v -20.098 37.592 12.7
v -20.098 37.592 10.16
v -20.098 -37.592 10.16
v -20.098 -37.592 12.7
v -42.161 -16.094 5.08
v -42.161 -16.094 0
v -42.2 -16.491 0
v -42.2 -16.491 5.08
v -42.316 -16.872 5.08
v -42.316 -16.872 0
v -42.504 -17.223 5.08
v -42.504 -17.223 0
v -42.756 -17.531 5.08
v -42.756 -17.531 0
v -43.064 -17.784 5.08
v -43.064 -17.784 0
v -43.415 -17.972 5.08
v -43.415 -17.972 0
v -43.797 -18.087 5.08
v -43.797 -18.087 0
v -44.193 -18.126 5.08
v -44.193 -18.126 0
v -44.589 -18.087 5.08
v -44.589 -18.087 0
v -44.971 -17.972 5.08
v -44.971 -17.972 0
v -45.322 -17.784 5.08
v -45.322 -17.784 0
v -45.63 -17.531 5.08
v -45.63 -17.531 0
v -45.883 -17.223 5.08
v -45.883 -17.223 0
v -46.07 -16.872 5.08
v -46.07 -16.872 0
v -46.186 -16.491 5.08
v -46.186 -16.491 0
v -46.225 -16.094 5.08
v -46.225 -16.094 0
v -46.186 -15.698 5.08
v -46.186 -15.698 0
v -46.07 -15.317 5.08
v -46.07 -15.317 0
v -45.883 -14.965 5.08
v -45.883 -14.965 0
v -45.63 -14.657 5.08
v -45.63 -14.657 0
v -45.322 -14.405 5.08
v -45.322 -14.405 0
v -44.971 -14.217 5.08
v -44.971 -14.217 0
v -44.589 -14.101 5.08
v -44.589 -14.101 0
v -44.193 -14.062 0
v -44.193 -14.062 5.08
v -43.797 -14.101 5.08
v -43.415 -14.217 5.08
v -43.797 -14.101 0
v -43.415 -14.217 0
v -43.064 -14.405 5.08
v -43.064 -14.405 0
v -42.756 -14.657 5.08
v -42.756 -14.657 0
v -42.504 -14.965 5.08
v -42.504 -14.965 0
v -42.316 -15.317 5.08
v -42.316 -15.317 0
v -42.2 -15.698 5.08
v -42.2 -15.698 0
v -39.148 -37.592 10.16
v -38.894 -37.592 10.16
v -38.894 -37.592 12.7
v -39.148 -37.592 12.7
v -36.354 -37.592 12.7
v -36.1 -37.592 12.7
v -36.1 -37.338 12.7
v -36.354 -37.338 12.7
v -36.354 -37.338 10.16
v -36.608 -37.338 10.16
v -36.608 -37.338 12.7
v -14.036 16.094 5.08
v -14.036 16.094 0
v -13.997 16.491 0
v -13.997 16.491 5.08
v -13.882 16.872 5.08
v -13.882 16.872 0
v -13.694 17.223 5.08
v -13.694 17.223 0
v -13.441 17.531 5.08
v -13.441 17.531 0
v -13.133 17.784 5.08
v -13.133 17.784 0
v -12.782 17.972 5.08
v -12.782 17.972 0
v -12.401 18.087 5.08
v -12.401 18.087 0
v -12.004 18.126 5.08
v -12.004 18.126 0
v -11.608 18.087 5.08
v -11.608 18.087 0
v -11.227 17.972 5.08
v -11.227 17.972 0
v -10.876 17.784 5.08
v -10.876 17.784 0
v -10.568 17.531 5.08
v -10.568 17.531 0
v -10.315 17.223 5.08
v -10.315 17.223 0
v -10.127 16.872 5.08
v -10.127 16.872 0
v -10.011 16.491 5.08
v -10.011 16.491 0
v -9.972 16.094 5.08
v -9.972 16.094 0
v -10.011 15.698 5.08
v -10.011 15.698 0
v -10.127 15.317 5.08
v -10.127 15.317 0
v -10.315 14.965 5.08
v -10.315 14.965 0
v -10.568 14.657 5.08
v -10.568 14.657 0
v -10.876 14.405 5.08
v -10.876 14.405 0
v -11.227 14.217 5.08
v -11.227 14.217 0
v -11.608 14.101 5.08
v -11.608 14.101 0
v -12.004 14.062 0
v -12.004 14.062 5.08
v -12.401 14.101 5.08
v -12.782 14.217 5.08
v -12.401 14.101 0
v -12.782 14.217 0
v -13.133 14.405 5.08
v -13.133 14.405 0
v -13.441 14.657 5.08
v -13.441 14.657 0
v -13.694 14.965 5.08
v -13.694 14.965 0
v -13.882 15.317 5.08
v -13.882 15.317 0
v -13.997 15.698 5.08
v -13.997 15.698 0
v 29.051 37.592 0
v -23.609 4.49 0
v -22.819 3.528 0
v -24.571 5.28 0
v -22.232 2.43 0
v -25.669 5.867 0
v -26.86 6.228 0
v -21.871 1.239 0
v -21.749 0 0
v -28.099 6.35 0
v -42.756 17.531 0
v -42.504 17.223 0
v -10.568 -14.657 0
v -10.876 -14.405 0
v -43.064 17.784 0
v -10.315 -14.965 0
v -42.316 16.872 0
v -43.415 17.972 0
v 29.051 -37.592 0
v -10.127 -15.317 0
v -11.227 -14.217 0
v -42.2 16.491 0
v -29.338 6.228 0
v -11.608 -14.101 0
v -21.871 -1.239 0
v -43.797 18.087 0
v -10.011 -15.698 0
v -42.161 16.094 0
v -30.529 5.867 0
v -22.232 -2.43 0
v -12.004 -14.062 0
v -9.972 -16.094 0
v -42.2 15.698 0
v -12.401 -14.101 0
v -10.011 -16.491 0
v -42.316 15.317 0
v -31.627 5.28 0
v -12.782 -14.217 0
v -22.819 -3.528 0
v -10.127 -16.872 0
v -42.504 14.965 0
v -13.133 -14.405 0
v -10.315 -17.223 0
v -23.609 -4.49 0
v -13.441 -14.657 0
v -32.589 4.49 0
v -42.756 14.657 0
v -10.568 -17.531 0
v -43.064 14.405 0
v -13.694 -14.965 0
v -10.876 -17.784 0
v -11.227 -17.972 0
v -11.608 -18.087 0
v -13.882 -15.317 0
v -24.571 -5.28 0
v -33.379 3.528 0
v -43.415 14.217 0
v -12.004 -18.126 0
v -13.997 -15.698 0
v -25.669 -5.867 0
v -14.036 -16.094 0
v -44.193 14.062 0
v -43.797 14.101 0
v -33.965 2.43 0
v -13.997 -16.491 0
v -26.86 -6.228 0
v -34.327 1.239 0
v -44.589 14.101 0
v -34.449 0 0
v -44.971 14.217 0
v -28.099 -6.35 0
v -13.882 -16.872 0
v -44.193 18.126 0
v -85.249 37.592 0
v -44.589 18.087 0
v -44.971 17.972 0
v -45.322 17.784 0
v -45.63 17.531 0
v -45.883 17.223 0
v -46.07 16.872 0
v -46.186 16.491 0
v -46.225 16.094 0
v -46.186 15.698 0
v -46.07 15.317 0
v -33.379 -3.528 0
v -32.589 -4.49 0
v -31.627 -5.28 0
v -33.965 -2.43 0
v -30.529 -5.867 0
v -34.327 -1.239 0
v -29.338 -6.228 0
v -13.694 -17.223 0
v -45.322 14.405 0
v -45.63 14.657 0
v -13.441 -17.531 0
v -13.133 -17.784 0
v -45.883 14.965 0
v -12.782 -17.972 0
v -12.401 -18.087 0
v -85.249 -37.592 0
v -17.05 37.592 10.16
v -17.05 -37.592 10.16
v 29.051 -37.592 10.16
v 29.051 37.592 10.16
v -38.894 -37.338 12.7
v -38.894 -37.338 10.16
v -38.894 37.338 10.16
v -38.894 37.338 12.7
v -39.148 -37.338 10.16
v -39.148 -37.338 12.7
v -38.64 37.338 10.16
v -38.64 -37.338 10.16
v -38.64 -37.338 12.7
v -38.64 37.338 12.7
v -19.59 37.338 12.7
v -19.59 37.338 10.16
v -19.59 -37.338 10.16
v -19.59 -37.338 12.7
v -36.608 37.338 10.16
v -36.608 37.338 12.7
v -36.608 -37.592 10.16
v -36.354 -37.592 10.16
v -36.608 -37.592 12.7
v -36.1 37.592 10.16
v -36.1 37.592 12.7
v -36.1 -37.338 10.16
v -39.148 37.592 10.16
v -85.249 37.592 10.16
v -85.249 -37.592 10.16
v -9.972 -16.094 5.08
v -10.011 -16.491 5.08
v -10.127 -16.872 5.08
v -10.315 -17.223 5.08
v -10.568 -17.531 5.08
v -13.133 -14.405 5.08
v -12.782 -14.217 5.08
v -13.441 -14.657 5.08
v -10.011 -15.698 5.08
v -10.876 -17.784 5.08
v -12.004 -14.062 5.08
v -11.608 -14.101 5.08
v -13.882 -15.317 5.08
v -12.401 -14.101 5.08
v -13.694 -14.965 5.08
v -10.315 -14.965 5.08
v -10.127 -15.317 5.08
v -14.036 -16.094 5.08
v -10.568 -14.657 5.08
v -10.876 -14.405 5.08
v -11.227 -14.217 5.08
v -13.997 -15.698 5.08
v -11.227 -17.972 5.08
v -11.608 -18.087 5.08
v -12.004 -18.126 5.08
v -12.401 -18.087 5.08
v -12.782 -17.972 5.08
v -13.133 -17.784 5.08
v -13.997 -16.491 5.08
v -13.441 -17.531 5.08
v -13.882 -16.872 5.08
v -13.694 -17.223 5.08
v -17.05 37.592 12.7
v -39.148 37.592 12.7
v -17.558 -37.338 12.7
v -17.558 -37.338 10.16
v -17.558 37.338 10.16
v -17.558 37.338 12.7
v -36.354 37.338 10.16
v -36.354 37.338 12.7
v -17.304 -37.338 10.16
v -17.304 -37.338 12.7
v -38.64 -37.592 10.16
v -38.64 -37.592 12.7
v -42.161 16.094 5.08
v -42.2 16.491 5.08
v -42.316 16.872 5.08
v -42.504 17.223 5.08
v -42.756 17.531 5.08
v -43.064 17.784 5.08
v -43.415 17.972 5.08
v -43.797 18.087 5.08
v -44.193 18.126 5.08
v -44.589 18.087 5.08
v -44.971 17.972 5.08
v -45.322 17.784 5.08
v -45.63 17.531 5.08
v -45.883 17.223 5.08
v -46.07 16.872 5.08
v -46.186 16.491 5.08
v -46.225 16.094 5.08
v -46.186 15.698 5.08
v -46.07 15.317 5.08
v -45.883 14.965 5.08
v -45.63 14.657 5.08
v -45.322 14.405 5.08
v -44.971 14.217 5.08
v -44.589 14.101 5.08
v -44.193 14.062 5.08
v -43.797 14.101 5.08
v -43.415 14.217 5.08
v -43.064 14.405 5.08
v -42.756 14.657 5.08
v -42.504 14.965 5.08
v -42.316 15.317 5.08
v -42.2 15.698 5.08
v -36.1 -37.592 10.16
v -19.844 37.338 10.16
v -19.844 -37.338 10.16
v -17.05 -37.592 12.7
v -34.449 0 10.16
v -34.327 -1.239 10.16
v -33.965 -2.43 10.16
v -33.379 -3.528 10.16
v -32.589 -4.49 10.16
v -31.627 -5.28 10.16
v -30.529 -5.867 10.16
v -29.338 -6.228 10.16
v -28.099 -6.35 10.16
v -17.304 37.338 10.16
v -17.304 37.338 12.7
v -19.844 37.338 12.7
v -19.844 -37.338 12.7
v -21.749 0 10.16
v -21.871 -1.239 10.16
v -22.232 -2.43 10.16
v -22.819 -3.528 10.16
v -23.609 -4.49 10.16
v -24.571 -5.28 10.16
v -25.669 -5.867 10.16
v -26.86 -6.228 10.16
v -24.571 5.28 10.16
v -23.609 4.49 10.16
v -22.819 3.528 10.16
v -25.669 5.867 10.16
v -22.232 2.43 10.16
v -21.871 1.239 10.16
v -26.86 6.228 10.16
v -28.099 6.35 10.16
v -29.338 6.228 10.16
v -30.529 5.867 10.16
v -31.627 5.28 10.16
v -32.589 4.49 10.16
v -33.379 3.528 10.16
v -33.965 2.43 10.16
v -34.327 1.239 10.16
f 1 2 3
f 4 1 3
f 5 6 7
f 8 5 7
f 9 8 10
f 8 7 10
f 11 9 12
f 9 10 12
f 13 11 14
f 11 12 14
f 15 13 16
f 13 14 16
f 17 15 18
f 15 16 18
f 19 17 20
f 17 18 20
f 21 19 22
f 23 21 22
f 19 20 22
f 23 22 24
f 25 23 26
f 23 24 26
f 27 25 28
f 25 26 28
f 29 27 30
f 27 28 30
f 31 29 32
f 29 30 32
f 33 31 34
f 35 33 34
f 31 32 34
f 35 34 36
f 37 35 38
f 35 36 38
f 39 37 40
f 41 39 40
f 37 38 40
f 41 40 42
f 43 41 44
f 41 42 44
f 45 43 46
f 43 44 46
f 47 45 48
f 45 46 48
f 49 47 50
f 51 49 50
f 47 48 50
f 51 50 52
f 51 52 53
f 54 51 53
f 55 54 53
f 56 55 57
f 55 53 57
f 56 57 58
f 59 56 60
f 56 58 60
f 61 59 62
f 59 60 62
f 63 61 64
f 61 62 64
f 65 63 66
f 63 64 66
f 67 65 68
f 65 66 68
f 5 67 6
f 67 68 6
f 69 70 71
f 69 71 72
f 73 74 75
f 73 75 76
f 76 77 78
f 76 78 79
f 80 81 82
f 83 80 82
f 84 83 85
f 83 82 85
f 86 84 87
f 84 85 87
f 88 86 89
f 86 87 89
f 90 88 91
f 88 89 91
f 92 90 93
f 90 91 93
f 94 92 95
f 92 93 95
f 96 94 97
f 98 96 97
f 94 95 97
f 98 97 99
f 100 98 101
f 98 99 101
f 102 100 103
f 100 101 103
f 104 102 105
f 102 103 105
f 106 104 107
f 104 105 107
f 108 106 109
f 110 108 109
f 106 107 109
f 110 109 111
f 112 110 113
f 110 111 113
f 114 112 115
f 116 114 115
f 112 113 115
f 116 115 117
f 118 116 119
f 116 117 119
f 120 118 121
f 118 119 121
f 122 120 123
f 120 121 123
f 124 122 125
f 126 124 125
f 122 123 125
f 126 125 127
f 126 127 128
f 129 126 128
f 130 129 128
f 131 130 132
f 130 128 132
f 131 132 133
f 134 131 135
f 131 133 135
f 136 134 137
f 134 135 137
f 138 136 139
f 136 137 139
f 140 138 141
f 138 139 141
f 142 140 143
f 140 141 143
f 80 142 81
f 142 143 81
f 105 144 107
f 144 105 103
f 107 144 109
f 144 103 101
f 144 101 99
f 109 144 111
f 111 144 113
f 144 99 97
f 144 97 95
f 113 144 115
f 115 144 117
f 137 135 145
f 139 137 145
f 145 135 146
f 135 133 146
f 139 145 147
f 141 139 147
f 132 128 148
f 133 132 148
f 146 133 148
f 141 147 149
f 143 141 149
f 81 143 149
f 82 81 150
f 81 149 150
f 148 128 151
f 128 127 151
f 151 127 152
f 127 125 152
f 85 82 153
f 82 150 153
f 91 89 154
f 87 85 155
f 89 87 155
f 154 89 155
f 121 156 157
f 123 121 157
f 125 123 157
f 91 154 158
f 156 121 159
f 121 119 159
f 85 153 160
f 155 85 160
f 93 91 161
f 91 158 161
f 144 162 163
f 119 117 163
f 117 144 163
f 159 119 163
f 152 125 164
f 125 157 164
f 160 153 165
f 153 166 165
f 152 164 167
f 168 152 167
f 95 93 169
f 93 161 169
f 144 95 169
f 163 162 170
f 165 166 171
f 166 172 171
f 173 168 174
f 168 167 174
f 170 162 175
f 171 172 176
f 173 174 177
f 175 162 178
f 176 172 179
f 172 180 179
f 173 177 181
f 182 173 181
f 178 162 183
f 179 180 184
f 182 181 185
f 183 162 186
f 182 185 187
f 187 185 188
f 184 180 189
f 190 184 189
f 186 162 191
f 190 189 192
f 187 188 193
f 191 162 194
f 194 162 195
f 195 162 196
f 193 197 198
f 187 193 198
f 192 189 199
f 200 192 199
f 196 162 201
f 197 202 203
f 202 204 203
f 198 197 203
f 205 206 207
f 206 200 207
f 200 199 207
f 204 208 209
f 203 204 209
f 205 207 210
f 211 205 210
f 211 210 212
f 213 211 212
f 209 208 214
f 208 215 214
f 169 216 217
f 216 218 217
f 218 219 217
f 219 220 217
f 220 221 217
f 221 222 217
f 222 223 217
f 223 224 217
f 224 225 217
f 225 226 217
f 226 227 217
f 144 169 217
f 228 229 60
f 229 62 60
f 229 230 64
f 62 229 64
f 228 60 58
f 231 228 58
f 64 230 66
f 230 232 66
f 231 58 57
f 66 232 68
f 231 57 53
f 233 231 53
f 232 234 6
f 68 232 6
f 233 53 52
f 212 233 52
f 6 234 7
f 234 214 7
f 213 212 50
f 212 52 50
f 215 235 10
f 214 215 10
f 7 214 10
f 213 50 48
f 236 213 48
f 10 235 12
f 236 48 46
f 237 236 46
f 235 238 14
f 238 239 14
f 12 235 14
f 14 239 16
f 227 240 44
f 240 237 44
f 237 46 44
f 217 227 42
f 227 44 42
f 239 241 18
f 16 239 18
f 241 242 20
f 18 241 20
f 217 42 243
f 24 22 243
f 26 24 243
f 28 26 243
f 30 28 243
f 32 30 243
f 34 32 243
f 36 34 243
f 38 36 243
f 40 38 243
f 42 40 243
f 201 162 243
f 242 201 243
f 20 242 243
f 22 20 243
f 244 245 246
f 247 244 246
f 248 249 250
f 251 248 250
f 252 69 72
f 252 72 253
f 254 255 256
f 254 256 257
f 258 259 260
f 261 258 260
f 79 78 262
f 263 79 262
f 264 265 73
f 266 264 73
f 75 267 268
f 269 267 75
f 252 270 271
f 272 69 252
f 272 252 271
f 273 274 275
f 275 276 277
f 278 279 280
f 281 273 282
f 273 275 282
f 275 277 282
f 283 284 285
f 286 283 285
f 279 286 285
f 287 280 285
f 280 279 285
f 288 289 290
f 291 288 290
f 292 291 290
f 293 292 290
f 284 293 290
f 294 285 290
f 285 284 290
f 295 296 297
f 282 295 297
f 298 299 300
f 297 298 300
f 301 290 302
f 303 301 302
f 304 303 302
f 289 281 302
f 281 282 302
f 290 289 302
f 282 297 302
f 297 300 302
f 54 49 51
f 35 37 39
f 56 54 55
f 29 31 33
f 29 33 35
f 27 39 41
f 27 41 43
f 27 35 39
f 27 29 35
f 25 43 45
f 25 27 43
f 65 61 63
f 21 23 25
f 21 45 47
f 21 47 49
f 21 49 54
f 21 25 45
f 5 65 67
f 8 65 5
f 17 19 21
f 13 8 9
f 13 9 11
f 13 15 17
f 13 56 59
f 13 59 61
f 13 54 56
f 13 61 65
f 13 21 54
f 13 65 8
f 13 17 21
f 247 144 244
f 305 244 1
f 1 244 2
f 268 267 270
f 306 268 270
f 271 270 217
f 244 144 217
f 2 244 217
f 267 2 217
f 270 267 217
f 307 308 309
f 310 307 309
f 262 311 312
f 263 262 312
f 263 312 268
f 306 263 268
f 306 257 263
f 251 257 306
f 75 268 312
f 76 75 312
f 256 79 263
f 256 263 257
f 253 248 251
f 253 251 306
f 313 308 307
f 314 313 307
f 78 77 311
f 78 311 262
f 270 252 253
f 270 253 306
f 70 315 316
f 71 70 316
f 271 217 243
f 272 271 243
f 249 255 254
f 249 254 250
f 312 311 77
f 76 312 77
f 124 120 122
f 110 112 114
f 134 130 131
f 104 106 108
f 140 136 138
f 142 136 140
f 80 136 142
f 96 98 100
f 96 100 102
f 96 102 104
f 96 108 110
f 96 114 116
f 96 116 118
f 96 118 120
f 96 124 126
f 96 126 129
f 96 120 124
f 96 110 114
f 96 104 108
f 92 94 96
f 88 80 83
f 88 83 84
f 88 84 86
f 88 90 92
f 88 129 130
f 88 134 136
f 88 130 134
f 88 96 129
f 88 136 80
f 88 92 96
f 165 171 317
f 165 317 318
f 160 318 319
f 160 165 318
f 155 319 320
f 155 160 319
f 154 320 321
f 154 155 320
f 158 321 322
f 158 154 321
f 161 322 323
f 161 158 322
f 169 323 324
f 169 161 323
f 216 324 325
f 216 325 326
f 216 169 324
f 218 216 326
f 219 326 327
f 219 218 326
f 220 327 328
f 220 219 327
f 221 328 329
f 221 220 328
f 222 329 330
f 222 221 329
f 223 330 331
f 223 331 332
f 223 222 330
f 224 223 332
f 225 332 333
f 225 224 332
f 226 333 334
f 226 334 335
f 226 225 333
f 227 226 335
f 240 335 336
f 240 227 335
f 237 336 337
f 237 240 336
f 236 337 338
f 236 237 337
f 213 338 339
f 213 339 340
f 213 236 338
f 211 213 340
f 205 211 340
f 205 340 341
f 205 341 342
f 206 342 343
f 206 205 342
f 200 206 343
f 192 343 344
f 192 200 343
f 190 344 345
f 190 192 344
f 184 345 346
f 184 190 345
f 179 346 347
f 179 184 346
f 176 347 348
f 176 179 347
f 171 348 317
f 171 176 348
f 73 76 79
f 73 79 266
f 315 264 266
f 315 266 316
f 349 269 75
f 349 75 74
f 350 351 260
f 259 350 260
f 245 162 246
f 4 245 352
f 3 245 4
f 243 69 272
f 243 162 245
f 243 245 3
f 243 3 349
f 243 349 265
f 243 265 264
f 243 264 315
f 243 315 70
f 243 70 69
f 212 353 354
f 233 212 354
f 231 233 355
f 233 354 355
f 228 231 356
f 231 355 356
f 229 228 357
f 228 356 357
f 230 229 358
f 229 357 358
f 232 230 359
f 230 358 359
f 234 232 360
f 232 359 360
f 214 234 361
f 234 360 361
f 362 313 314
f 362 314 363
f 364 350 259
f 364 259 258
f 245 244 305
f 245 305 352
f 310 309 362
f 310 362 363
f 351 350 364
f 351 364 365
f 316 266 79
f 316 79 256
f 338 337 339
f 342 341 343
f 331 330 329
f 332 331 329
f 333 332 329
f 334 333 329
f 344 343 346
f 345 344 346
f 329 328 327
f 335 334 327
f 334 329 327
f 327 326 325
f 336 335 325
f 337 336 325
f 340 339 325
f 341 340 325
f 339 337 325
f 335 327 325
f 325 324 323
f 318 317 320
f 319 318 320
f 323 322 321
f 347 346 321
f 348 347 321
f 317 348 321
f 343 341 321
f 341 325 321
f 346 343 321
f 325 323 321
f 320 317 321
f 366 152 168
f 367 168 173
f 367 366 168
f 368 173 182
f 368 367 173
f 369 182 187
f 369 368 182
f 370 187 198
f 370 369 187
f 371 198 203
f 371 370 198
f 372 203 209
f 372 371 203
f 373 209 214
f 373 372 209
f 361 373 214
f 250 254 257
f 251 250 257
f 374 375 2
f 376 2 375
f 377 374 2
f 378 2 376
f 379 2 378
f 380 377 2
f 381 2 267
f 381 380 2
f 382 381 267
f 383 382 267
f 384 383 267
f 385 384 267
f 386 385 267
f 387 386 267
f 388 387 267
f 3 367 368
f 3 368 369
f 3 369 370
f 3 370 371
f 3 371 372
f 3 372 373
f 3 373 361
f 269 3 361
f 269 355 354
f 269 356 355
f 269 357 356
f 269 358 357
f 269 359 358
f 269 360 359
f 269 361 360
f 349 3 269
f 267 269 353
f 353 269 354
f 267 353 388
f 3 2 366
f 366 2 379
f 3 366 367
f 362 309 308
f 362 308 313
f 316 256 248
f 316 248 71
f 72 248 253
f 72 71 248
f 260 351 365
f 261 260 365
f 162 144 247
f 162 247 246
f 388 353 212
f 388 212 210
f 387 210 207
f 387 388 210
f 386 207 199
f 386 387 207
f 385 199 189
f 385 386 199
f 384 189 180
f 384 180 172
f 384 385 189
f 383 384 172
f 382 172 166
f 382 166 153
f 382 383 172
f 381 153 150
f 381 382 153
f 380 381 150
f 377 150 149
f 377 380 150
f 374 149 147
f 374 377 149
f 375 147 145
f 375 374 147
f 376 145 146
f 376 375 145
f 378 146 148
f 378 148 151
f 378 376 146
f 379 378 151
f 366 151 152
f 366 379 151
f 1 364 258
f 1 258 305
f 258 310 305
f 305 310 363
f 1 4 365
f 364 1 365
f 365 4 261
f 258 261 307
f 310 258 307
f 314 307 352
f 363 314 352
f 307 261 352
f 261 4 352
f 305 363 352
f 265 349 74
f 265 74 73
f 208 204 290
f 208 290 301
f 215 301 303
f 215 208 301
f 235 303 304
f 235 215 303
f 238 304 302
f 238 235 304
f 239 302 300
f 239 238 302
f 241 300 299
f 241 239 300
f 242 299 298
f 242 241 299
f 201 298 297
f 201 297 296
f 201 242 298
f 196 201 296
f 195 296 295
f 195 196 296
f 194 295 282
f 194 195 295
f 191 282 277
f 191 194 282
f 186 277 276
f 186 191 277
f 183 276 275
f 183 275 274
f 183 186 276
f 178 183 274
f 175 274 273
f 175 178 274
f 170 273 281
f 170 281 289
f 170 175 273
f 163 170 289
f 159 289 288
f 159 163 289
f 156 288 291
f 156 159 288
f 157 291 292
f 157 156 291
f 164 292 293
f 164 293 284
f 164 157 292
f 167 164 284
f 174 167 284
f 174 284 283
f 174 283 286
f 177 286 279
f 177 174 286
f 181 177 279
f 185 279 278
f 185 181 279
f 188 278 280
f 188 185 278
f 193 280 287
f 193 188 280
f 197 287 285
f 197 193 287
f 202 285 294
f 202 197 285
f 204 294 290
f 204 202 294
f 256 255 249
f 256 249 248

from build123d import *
from build123d.topology import SkipClean

# Parameters (mm, degrees)
SKETCH1_W                 = 57.15
SKETCH1_H                 = 37.592
BOSS_EXTRUDE1_DEPTH       = 10.16
SKETCH2_W                 = 0.254
SKETCH2_H                 = 37.592
SKETCH2_W_2               = 2.032
BOSS_EXTRUDE2_DEPTH       = 2.54
SKETCH3_R                 = 6.35
CUT_EXTRUDE1_DEPTH        = 21.082
SKETCH4_R                 = 2.032
CUT_EXTRUDE2_DEPTH        = 5.08
SKETCH5_W                 = 2.54
SKETCH5_H                 = 0.254
BOSS_EXTRUDE3_DEPTH       = 3.048
MIRROR2_COPY_1_SKETCH_W   = 57.15
MIRROR2_COPY_1_SKETCH_H   = 37.592
MIRROR2_COPY_1_DEPTH      = 10.16
MIRROR2_COPY_2_SKETCH_W   = 0.254
MIRROR2_COPY_2_SKETCH_H   = 37.592
MIRROR2_COPY_2_SKETCH_W_2 = 2.032
MIRROR2_COPY_2_DEPTH      = 2.54
MIRROR2_COPY_3_SKETCH_R   = 6.35
MIRROR2_COPY_3_DEPTH      = 21.082
MIRROR2_COPY_4_SKETCH_R   = 2.032
MIRROR2_COPY_4_DEPTH      = 5.08
MIRROR2_COPY_5_SKETCH_W   = 2.54
MIRROR2_COPY_5_SKETCH_H   = 0.254
MIRROR2_COPY_5_DEPTH      = 3.048


with BuildPart() as part:
    # Sketch1 → Boss-Extrude1 (new body)
    with BuildSketch(Plane.XY):
        with Locations((0.47625, 18.796)):
            Rectangle(SKETCH1_W, SKETCH1_H)
    boss_extrude1 = extrude(amount=BOSS_EXTRUDE1_DEPTH)

    # Sketch2 → Boss-Extrude2 (add)
    with BuildSketch(Plane.XY.offset(10.16)):
        with Locations((-19.97075, 18.796)):
            Rectangle(SKETCH2_W, SKETCH2_H)
        with Locations((-18.57375, 18.796)):
            Rectangle(SKETCH2_W_2, SKETCH2_H)
        with Locations((-17.17675, 18.796)):
            Rectangle(SKETCH2_W, SKETCH2_H)
    boss_extrude2 = extrude(amount=BOSS_EXTRUDE2_DEPTH)

    # Sketch3 → Cut-Extrude1 (cut)
    with BuildSketch(Plane.XY.offset(10.16)):
        with Locations((-28.09875, 0)):
            Circle(SKETCH3_R)
    cut_extrude1 = extrude(amount=-CUT_EXTRUDE1_DEPTH, mode=Mode.SUBTRACT)

    # Sketch4 → Cut-Extrude2 (cut)
    with BuildSketch(Plane(origin=(0, 0, 0), x_dir=(-1, 0, 0), z_dir=(0, 0, -1))):
        with Locations((12.004431959, 16.094318041)):
            Circle(SKETCH4_R)
    cut_extrude2 = extrude(amount=-CUT_EXTRUDE2_DEPTH, mode=Mode.SUBTRACT)

    # Sketch5 → Boss-Extrude3 (add)
    with BuildSketch(Plane.ZY.offset(20.09775)):
        with Locations((11.43, 37.465)):
            Rectangle(SKETCH5_W, SKETCH5_H)
    boss_extrude3 = extrude(amount=-BOSS_EXTRUDE3_DEPTH)

    # Mirror1: Boss-Extrude1, Boss-Extrude2, Cut-Extrude1, Cut-Extrude2, Boss-Extrude3 across plane
    with SkipClean():  # the faces are left unmerged after this step: merging them gives an invalid solid
        add(boss_extrude1.mirror(Plane(origin=(-28.09875, 37.592, 10.16), x_dir=(0, 0, 1), z_dir=(1, 0, 0))))
        add(boss_extrude2.mirror(Plane(origin=(-28.09875, 37.592, 10.16), x_dir=(0, 0, 1), z_dir=(1, 0, 0))))
        add(cut_extrude1.mirror(Plane(origin=(-28.09875, 37.592, 10.16), x_dir=(0, 0, 1), z_dir=(1, 0, 0))), mode=Mode.SUBTRACT)
        add(cut_extrude2.mirror(Plane(origin=(-28.09875, 37.592, 10.16), x_dir=(0, 0, 1), z_dir=(1, 0, 0))), mode=Mode.SUBTRACT)
        add(boss_extrude3.mirror(Plane(origin=(-28.09875, 37.592, 10.16), x_dir=(0, 0, 1), z_dir=(1, 0, 0))))
    add(part.part.scale(1), mode=Mode.REPLACE)  # the faces are merged on a copy

    # Mirror2: Boss-Extrude1, Boss-Extrude2, Cut-Extrude1, Cut-Extrude2, Boss-Extrude3 across plane
    with SkipClean():  # the faces are left unmerged after this step: merging them gives an invalid solid
        add(boss_extrude1.mirror(Plane.ZX))
        add(boss_extrude2.mirror(Plane.ZX))
        add(cut_extrude1.mirror(Plane.ZX), mode=Mode.SUBTRACT)
        add(cut_extrude2.mirror(Plane.ZX), mode=Mode.SUBTRACT)
        add(boss_extrude3.mirror(Plane.ZX))
    add(part.part.scale(1), mode=Mode.REPLACE)  # the faces are merged on a copy

    # Mirror2 copy 1 sketch → Mirror2 copy 1 (add)
    with BuildSketch(Plane(origin=(-56.1975, 0, 0), x_dir=(-1, 0, 0), z_dir=(0, 0, 1))):
        with Locations((0.47625, 18.796)):
            Rectangle(MIRROR2_COPY_1_SKETCH_W, MIRROR2_COPY_1_SKETCH_H)
    extrude(amount=MIRROR2_COPY_1_DEPTH)

    # Mirror2 copy 2 sketch → Mirror2 copy 2 (add)
    with BuildSketch(Plane(origin=(-56.1975, 0, 10.16), x_dir=(-1, 0, 0), z_dir=(0, 0, 1))):
        with Locations((-19.97075, 18.796)):
            Rectangle(MIRROR2_COPY_2_SKETCH_W, MIRROR2_COPY_2_SKETCH_H)
        with Locations((-18.57375, 18.796)):
            Rectangle(MIRROR2_COPY_2_SKETCH_W_2, MIRROR2_COPY_2_SKETCH_H)
        with Locations((-17.17675, 18.796)):
            Rectangle(MIRROR2_COPY_2_SKETCH_W, MIRROR2_COPY_2_SKETCH_H)
    extrude(amount=MIRROR2_COPY_2_DEPTH)

    # Mirror2 copy 3 sketch → Mirror2 copy 3 (cut)
    with SkipClean():  # the faces are left unmerged after this step: merging them gives an invalid solid
        with BuildSketch(Plane(origin=(-56.1975, 0, 10.16), x_dir=(-1, 0, 0), z_dir=(0, 0, 1))):
            with Locations((-28.09875, 0)):
                Circle(MIRROR2_COPY_3_SKETCH_R)
        extrude(amount=-MIRROR2_COPY_3_DEPTH, mode=Mode.SUBTRACT)

    # Mirror2 copy 4 sketch → Mirror2 copy 4 (cut)
    with SkipClean():  # the faces are left unmerged after this step: merging them gives an invalid solid
        with BuildSketch(Plane(origin=(-56.1975, 0, 0), x_dir=(1, 0, 0), z_dir=(0, 0, -1))):
            with Locations((12.004431959, 16.094318041)):
                Circle(MIRROR2_COPY_4_SKETCH_R)
        extrude(amount=-MIRROR2_COPY_4_DEPTH, mode=Mode.SUBTRACT)

    # Mirror2 copy 5 sketch → Mirror2 copy 5 (add)
    with SkipClean():  # the faces are left unmerged after this step: merging them gives an invalid solid
        with BuildSketch(Plane(origin=(-36.09975, 0, 0), x_dir=(0, 0, 1), z_dir=(1, 0, 0))):
            with Locations((11.43, 37.465)):
                Rectangle(MIRROR2_COPY_5_SKETCH_W, MIRROR2_COPY_5_SKETCH_H)
        extrude(amount=-MIRROR2_COPY_5_DEPTH)


solid = part.part
